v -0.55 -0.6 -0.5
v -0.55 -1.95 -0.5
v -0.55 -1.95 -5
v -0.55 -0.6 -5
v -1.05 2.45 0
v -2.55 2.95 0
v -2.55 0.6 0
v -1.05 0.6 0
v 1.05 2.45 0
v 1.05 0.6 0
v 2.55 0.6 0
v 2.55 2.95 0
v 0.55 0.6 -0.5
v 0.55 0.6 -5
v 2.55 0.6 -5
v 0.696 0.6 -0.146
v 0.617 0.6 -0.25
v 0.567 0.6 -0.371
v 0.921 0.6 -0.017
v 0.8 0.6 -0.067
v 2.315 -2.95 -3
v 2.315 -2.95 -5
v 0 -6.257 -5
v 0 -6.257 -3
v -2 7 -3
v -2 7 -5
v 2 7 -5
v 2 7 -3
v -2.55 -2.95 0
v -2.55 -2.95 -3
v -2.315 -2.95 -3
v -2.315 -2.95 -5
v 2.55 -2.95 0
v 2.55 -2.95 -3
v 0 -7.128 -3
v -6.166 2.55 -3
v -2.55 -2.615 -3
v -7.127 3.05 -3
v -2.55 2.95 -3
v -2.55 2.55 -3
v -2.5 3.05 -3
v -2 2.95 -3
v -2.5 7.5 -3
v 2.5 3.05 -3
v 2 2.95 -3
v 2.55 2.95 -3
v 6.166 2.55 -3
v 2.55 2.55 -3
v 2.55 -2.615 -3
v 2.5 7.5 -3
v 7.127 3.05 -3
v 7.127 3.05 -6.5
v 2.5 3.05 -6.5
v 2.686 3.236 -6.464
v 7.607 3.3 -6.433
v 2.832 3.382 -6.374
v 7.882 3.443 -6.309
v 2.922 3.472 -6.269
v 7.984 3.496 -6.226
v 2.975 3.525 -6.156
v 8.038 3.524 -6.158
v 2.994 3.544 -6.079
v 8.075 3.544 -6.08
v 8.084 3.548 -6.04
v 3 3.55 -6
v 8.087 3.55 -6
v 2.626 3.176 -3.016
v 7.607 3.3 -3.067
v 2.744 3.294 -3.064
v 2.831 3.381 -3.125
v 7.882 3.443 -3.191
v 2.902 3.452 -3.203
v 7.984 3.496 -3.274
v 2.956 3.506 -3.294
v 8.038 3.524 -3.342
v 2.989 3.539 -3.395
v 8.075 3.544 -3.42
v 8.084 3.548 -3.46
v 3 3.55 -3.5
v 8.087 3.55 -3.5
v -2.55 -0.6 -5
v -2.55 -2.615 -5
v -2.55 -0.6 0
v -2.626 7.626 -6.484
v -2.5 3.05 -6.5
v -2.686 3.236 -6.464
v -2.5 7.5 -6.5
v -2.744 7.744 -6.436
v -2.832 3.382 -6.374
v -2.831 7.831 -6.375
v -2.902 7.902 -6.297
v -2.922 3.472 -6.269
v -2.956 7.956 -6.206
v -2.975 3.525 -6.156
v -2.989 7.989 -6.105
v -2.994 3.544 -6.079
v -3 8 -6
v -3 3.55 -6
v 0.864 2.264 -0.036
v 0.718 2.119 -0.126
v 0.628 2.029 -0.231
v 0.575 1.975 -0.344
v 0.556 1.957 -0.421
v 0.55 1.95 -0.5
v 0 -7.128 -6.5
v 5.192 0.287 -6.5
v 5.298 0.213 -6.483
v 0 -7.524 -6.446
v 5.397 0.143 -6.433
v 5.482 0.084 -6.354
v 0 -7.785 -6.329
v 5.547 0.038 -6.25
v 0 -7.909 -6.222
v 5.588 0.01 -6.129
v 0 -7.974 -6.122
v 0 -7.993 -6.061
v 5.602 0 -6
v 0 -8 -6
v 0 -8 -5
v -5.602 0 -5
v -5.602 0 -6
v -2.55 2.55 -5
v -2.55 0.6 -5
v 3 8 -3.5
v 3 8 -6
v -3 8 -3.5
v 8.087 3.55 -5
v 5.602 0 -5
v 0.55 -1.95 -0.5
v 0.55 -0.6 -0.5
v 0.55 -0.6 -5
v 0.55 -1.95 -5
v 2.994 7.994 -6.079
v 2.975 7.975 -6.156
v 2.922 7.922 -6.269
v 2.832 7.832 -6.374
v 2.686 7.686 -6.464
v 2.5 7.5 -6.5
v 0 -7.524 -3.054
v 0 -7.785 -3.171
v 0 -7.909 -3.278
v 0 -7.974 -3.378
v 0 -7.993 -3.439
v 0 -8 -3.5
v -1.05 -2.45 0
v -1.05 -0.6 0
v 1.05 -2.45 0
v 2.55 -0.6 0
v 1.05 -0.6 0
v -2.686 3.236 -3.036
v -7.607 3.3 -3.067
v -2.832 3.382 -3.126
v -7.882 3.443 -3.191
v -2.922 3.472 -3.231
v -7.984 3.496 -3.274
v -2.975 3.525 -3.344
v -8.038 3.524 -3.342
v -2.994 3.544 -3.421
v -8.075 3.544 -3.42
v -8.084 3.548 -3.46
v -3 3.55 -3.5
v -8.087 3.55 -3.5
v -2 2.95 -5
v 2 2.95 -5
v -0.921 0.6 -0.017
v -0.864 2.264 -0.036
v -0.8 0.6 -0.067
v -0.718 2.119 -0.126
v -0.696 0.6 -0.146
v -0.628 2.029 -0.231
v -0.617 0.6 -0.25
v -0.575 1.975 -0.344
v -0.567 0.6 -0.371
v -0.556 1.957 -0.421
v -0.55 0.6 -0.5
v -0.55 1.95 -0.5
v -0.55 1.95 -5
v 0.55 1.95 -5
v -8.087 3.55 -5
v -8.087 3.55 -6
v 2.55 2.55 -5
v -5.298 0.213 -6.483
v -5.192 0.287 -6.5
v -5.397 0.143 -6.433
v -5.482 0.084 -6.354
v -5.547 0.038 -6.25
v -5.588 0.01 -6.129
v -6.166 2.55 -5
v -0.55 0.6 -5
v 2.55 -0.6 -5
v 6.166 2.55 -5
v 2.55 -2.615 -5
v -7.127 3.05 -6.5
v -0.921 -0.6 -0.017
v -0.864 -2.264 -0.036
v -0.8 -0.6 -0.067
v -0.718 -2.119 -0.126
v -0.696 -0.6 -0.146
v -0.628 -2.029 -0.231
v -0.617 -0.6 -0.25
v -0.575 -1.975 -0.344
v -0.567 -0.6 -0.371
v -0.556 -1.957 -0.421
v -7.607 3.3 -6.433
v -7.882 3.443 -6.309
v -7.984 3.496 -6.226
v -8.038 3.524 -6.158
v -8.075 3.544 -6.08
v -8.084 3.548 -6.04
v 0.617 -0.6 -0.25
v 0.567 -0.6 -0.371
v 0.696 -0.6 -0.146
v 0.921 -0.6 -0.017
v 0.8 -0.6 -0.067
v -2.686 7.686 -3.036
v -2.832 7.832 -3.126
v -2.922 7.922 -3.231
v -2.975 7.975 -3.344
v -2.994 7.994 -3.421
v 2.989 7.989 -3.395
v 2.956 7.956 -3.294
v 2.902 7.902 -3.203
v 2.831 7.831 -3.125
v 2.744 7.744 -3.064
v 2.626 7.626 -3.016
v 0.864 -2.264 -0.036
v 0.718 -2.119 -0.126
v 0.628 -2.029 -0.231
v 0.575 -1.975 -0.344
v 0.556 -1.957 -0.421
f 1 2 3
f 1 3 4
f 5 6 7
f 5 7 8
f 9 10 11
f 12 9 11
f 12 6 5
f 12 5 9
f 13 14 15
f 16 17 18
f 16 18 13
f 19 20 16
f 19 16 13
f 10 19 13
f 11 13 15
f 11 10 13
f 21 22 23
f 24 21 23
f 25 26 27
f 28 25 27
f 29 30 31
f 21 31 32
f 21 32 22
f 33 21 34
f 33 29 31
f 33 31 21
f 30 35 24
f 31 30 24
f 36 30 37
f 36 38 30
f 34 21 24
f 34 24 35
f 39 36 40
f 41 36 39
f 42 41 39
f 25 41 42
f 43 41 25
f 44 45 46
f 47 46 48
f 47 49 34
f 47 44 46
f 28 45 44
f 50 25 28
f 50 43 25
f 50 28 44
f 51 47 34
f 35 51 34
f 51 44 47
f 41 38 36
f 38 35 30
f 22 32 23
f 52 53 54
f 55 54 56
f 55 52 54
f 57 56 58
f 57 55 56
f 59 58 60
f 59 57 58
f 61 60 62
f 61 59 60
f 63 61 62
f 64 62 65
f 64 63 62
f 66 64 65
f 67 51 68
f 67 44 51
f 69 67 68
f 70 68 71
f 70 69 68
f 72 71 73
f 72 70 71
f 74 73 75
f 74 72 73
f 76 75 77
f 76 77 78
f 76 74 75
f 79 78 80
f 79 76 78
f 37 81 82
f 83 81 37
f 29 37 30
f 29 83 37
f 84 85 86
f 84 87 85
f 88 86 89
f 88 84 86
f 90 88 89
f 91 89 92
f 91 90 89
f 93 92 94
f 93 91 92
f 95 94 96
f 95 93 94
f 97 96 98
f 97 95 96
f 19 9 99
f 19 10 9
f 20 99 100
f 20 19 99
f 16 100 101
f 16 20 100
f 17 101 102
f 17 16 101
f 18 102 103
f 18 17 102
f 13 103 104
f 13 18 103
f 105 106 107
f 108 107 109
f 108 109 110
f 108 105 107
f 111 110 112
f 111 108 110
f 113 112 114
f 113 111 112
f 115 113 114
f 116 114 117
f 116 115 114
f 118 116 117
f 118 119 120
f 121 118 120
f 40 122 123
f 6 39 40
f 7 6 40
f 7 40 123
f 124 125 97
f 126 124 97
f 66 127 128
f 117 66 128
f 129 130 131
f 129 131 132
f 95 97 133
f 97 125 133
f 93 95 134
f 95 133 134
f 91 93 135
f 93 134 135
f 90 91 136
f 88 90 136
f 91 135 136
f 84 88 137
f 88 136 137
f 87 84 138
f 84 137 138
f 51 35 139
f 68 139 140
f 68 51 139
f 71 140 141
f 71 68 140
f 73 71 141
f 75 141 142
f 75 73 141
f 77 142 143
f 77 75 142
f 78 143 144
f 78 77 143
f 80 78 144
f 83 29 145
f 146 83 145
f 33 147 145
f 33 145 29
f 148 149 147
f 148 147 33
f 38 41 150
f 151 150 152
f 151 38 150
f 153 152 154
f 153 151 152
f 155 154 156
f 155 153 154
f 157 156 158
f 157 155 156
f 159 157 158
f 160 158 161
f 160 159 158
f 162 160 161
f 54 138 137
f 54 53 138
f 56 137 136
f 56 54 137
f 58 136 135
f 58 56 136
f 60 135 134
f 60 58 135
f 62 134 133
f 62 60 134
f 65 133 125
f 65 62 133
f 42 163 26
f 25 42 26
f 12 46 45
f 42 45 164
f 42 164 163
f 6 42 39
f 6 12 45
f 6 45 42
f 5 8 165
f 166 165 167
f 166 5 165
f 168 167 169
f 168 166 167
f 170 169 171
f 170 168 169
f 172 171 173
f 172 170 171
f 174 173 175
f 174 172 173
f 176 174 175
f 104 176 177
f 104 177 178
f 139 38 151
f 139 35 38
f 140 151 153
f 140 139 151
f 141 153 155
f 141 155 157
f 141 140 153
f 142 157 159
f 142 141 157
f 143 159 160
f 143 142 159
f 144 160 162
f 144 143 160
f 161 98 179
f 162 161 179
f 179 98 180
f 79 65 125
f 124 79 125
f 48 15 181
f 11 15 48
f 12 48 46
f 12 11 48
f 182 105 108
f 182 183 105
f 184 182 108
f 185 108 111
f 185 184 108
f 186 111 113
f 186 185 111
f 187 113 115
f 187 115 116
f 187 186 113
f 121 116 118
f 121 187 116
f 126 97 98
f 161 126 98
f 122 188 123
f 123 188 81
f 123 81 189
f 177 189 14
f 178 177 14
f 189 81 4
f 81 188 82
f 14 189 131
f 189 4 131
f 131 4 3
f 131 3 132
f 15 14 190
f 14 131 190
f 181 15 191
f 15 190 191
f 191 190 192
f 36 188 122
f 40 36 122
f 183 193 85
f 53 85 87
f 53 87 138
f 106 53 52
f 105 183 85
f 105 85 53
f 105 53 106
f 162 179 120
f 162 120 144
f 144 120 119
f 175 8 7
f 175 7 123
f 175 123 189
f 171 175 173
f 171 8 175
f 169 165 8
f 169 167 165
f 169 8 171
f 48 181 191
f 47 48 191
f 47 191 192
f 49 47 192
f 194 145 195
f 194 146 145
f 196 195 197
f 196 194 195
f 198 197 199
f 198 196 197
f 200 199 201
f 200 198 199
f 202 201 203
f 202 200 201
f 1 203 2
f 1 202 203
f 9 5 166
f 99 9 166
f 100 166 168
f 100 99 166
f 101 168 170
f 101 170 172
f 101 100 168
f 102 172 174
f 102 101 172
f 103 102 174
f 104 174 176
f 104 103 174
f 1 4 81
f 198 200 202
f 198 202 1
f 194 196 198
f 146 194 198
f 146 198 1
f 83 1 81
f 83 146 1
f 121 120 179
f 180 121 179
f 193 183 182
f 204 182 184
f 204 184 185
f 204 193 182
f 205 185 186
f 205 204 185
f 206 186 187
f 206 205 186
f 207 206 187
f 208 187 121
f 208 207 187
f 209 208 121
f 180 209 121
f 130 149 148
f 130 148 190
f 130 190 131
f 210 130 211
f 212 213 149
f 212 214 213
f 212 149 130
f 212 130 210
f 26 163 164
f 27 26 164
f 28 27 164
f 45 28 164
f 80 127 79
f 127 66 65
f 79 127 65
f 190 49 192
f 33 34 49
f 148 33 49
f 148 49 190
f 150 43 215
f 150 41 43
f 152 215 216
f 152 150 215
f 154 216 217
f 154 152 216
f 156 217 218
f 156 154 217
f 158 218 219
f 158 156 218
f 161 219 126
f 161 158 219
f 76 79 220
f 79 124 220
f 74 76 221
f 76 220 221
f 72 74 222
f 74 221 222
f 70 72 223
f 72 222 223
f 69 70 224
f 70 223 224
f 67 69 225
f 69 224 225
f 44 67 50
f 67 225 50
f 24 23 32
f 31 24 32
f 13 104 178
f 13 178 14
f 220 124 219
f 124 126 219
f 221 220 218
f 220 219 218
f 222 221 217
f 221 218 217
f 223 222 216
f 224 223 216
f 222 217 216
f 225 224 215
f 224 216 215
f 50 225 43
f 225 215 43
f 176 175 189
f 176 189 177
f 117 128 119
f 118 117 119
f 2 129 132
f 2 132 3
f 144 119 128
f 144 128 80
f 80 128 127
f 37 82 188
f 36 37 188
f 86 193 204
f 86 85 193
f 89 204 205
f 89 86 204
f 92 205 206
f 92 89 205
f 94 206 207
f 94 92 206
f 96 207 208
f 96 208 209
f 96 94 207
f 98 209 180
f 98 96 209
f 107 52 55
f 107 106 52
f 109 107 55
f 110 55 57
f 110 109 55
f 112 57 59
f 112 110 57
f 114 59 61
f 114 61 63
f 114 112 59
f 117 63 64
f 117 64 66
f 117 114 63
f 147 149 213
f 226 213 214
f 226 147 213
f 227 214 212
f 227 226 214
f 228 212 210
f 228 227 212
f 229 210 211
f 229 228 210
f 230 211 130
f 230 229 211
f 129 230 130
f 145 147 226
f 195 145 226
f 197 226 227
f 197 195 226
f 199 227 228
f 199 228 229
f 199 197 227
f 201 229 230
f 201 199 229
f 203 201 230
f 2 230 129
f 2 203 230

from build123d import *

# Parameters (mm, degrees)
F1_DEPTH = 5
F3_DEPTH = 1.5
F5_DEPTH = 2
F6_R     = 0.5
F7_R     = 0.5
F8_R     = 0.5


with BuildPart() as f1:
    # F0 (on Top) → F1 (new body)
    with BuildSketch(Plane.XY):
        Polygon((-0.55, 0.6), (-0.55, 1.9502386091), (0.55, 1.9502386091), (0.55, 0.6), (2.0002388261, 0.6), (2.55, 0.6), (2.55, 2.9502386091), (0, 2.9502386091), (-2.55, 2.9502386091), (-2.55, 0.6), (-2.0002388261, 0.6), align=None)
    extrude(amount=-F1_DEPTH)



with BuildPart() as f1b:
    # F0 (on Top) → F1, piece 2 (new body)
    with BuildSketch(Plane.XY):
        Polygon((-0.55, -0.6), (-2.0002388261, -0.6), (-2.55, -0.6), (-2.55, -2.9502386091), (0, -2.9502386091), (2.55, -2.9502386091), (2.55, -0.6), (2.0002388261, -0.6), (0.55, -0.6), (0.55, -1.9502386091), (-0.55, -1.9502386091), align=None)
    extrude(amount=-F1_DEPTH)


with BuildPart() as f1_1:
    add(f1.part)

    add(f1b.part)  # F3 merges F1b
    # F2 (on face) → F3 (join)
    with BuildSketch(Plane(origin=(0, 0, -5), x_dir=(1, 0, 0), z_dir=(0, 0, -1))):
        Polygon((0, 1.9502386091), (0, 0), (0, -8), (3, -8), (3, -3.55), (8.0873970663, -3.55), (5.6016603057, 0), (0, 8), (0, 2.9502386091), (2.55, 2.9502386091), (2.55, 0.6), (0.55, 0.6), (0.55, 1.9502386091), align=None)
        Polygon((0, -8), (0, 0), (0, 1.9502386091), (-0.55, 1.9502386091), (-0.55, 0.6), (-2.55, 0.6), (-2.55, 2.9502386091), (0, 2.9502386091), (0, 8), (-5.6016603057, 0), (-8.0873970663, -3.55), (-3, -3.55), (-3, -8), align=None)
        Polygon((-0.55, 1.9502386091), (0, 1.9502386091), (0, 2.9502386091), (-2.55, 2.9502386091), (-2.55, 0.6), (-0.55, 0.6), align=None)
        Polygon((0, 2.9502386091), (0, 1.9502386091), (0.55, 1.9502386091), (0.55, 0.6), (2.55, 0.6), (2.55, 2.9502386091), align=None)
    extrude(amount=F3_DEPTH)

    # F4 (on face) → F5 (join)
    with BuildSketch(Plane.XY.offset(-5)):
        Polygon((3, 8), (-3, 8), (-3, 3.55), (-8.0873970663, 3.55), (0, -8), (8.0873970663, 3.55), (3, 3.55), align=None)
        Polygon((2.3151064033, -2.9502386091), (0, -6.2565532044), (-2.3151064033, -2.9502386091), (-2.55, -2.9502386091), (-2.55, -2.6147757872), (-6.1664149394, 2.55), (-3, 2.55), (-2.55, 2.55), (-2.55, 2.9502386091), (-2, 2.9502386091), (-2, 3.55), (-2, 7), (2, 7), (2, 3.55), (2, 2.9502386091), (2.55, 2.9502386091), (2.55, 2.55), (3, 2.55), (6.1664149394, 2.55), (2.55, -2.6147757872), (2.55, -2.9502386091), align=None, mode=Mode.SUBTRACT)
    extrude(amount=F5_DEPTH)

    # F6
    f6_edges = [f1_1.edges().sort_by_distance(p)[0] for p in [
        (5.543699, 3.55, -6.5),
        (3, 5.775, -6.5),
        (0, 8, -6.5),
        (-3, 5.775, -6.5),
        (-5.543699, 3.55, -6.5),
        (-4.043699, -2.225, -6.5),
        (4.043699, -2.225, -6.5),
    ]]
    fillet(f6_edges, radius=F6_R)

    # F7
    f7_edges = [f1_1.edges().sort_by_distance(p)[0] for p in [
        (4.043699, -2.225, -3),
        (-4.043699, -2.225, -3),
        (-5.543699, 3.55, -3),
        (-3, 5.775, -3),
        (0, 8, -3),
        (3, 5.775, -3),
        (5.543699, 3.55, -3),
    ]]
    fillet(f7_edges, radius=F7_R)

    # F8
    f8_edges = [f1_1.edges().sort_by_distance(p)[0] for p in [
        (-0.55, 1.275119, 0),
        (0, 1.950239, 0),
        (0.55, 1.275119, 0),
        (-0.55, -1.275119, 0),
        (0, -1.950239, 0),
        (0.55, -1.275119, 0),
    ]]
    fillet(f8_edges, radius=F8_R)


solid = f1_1.part
